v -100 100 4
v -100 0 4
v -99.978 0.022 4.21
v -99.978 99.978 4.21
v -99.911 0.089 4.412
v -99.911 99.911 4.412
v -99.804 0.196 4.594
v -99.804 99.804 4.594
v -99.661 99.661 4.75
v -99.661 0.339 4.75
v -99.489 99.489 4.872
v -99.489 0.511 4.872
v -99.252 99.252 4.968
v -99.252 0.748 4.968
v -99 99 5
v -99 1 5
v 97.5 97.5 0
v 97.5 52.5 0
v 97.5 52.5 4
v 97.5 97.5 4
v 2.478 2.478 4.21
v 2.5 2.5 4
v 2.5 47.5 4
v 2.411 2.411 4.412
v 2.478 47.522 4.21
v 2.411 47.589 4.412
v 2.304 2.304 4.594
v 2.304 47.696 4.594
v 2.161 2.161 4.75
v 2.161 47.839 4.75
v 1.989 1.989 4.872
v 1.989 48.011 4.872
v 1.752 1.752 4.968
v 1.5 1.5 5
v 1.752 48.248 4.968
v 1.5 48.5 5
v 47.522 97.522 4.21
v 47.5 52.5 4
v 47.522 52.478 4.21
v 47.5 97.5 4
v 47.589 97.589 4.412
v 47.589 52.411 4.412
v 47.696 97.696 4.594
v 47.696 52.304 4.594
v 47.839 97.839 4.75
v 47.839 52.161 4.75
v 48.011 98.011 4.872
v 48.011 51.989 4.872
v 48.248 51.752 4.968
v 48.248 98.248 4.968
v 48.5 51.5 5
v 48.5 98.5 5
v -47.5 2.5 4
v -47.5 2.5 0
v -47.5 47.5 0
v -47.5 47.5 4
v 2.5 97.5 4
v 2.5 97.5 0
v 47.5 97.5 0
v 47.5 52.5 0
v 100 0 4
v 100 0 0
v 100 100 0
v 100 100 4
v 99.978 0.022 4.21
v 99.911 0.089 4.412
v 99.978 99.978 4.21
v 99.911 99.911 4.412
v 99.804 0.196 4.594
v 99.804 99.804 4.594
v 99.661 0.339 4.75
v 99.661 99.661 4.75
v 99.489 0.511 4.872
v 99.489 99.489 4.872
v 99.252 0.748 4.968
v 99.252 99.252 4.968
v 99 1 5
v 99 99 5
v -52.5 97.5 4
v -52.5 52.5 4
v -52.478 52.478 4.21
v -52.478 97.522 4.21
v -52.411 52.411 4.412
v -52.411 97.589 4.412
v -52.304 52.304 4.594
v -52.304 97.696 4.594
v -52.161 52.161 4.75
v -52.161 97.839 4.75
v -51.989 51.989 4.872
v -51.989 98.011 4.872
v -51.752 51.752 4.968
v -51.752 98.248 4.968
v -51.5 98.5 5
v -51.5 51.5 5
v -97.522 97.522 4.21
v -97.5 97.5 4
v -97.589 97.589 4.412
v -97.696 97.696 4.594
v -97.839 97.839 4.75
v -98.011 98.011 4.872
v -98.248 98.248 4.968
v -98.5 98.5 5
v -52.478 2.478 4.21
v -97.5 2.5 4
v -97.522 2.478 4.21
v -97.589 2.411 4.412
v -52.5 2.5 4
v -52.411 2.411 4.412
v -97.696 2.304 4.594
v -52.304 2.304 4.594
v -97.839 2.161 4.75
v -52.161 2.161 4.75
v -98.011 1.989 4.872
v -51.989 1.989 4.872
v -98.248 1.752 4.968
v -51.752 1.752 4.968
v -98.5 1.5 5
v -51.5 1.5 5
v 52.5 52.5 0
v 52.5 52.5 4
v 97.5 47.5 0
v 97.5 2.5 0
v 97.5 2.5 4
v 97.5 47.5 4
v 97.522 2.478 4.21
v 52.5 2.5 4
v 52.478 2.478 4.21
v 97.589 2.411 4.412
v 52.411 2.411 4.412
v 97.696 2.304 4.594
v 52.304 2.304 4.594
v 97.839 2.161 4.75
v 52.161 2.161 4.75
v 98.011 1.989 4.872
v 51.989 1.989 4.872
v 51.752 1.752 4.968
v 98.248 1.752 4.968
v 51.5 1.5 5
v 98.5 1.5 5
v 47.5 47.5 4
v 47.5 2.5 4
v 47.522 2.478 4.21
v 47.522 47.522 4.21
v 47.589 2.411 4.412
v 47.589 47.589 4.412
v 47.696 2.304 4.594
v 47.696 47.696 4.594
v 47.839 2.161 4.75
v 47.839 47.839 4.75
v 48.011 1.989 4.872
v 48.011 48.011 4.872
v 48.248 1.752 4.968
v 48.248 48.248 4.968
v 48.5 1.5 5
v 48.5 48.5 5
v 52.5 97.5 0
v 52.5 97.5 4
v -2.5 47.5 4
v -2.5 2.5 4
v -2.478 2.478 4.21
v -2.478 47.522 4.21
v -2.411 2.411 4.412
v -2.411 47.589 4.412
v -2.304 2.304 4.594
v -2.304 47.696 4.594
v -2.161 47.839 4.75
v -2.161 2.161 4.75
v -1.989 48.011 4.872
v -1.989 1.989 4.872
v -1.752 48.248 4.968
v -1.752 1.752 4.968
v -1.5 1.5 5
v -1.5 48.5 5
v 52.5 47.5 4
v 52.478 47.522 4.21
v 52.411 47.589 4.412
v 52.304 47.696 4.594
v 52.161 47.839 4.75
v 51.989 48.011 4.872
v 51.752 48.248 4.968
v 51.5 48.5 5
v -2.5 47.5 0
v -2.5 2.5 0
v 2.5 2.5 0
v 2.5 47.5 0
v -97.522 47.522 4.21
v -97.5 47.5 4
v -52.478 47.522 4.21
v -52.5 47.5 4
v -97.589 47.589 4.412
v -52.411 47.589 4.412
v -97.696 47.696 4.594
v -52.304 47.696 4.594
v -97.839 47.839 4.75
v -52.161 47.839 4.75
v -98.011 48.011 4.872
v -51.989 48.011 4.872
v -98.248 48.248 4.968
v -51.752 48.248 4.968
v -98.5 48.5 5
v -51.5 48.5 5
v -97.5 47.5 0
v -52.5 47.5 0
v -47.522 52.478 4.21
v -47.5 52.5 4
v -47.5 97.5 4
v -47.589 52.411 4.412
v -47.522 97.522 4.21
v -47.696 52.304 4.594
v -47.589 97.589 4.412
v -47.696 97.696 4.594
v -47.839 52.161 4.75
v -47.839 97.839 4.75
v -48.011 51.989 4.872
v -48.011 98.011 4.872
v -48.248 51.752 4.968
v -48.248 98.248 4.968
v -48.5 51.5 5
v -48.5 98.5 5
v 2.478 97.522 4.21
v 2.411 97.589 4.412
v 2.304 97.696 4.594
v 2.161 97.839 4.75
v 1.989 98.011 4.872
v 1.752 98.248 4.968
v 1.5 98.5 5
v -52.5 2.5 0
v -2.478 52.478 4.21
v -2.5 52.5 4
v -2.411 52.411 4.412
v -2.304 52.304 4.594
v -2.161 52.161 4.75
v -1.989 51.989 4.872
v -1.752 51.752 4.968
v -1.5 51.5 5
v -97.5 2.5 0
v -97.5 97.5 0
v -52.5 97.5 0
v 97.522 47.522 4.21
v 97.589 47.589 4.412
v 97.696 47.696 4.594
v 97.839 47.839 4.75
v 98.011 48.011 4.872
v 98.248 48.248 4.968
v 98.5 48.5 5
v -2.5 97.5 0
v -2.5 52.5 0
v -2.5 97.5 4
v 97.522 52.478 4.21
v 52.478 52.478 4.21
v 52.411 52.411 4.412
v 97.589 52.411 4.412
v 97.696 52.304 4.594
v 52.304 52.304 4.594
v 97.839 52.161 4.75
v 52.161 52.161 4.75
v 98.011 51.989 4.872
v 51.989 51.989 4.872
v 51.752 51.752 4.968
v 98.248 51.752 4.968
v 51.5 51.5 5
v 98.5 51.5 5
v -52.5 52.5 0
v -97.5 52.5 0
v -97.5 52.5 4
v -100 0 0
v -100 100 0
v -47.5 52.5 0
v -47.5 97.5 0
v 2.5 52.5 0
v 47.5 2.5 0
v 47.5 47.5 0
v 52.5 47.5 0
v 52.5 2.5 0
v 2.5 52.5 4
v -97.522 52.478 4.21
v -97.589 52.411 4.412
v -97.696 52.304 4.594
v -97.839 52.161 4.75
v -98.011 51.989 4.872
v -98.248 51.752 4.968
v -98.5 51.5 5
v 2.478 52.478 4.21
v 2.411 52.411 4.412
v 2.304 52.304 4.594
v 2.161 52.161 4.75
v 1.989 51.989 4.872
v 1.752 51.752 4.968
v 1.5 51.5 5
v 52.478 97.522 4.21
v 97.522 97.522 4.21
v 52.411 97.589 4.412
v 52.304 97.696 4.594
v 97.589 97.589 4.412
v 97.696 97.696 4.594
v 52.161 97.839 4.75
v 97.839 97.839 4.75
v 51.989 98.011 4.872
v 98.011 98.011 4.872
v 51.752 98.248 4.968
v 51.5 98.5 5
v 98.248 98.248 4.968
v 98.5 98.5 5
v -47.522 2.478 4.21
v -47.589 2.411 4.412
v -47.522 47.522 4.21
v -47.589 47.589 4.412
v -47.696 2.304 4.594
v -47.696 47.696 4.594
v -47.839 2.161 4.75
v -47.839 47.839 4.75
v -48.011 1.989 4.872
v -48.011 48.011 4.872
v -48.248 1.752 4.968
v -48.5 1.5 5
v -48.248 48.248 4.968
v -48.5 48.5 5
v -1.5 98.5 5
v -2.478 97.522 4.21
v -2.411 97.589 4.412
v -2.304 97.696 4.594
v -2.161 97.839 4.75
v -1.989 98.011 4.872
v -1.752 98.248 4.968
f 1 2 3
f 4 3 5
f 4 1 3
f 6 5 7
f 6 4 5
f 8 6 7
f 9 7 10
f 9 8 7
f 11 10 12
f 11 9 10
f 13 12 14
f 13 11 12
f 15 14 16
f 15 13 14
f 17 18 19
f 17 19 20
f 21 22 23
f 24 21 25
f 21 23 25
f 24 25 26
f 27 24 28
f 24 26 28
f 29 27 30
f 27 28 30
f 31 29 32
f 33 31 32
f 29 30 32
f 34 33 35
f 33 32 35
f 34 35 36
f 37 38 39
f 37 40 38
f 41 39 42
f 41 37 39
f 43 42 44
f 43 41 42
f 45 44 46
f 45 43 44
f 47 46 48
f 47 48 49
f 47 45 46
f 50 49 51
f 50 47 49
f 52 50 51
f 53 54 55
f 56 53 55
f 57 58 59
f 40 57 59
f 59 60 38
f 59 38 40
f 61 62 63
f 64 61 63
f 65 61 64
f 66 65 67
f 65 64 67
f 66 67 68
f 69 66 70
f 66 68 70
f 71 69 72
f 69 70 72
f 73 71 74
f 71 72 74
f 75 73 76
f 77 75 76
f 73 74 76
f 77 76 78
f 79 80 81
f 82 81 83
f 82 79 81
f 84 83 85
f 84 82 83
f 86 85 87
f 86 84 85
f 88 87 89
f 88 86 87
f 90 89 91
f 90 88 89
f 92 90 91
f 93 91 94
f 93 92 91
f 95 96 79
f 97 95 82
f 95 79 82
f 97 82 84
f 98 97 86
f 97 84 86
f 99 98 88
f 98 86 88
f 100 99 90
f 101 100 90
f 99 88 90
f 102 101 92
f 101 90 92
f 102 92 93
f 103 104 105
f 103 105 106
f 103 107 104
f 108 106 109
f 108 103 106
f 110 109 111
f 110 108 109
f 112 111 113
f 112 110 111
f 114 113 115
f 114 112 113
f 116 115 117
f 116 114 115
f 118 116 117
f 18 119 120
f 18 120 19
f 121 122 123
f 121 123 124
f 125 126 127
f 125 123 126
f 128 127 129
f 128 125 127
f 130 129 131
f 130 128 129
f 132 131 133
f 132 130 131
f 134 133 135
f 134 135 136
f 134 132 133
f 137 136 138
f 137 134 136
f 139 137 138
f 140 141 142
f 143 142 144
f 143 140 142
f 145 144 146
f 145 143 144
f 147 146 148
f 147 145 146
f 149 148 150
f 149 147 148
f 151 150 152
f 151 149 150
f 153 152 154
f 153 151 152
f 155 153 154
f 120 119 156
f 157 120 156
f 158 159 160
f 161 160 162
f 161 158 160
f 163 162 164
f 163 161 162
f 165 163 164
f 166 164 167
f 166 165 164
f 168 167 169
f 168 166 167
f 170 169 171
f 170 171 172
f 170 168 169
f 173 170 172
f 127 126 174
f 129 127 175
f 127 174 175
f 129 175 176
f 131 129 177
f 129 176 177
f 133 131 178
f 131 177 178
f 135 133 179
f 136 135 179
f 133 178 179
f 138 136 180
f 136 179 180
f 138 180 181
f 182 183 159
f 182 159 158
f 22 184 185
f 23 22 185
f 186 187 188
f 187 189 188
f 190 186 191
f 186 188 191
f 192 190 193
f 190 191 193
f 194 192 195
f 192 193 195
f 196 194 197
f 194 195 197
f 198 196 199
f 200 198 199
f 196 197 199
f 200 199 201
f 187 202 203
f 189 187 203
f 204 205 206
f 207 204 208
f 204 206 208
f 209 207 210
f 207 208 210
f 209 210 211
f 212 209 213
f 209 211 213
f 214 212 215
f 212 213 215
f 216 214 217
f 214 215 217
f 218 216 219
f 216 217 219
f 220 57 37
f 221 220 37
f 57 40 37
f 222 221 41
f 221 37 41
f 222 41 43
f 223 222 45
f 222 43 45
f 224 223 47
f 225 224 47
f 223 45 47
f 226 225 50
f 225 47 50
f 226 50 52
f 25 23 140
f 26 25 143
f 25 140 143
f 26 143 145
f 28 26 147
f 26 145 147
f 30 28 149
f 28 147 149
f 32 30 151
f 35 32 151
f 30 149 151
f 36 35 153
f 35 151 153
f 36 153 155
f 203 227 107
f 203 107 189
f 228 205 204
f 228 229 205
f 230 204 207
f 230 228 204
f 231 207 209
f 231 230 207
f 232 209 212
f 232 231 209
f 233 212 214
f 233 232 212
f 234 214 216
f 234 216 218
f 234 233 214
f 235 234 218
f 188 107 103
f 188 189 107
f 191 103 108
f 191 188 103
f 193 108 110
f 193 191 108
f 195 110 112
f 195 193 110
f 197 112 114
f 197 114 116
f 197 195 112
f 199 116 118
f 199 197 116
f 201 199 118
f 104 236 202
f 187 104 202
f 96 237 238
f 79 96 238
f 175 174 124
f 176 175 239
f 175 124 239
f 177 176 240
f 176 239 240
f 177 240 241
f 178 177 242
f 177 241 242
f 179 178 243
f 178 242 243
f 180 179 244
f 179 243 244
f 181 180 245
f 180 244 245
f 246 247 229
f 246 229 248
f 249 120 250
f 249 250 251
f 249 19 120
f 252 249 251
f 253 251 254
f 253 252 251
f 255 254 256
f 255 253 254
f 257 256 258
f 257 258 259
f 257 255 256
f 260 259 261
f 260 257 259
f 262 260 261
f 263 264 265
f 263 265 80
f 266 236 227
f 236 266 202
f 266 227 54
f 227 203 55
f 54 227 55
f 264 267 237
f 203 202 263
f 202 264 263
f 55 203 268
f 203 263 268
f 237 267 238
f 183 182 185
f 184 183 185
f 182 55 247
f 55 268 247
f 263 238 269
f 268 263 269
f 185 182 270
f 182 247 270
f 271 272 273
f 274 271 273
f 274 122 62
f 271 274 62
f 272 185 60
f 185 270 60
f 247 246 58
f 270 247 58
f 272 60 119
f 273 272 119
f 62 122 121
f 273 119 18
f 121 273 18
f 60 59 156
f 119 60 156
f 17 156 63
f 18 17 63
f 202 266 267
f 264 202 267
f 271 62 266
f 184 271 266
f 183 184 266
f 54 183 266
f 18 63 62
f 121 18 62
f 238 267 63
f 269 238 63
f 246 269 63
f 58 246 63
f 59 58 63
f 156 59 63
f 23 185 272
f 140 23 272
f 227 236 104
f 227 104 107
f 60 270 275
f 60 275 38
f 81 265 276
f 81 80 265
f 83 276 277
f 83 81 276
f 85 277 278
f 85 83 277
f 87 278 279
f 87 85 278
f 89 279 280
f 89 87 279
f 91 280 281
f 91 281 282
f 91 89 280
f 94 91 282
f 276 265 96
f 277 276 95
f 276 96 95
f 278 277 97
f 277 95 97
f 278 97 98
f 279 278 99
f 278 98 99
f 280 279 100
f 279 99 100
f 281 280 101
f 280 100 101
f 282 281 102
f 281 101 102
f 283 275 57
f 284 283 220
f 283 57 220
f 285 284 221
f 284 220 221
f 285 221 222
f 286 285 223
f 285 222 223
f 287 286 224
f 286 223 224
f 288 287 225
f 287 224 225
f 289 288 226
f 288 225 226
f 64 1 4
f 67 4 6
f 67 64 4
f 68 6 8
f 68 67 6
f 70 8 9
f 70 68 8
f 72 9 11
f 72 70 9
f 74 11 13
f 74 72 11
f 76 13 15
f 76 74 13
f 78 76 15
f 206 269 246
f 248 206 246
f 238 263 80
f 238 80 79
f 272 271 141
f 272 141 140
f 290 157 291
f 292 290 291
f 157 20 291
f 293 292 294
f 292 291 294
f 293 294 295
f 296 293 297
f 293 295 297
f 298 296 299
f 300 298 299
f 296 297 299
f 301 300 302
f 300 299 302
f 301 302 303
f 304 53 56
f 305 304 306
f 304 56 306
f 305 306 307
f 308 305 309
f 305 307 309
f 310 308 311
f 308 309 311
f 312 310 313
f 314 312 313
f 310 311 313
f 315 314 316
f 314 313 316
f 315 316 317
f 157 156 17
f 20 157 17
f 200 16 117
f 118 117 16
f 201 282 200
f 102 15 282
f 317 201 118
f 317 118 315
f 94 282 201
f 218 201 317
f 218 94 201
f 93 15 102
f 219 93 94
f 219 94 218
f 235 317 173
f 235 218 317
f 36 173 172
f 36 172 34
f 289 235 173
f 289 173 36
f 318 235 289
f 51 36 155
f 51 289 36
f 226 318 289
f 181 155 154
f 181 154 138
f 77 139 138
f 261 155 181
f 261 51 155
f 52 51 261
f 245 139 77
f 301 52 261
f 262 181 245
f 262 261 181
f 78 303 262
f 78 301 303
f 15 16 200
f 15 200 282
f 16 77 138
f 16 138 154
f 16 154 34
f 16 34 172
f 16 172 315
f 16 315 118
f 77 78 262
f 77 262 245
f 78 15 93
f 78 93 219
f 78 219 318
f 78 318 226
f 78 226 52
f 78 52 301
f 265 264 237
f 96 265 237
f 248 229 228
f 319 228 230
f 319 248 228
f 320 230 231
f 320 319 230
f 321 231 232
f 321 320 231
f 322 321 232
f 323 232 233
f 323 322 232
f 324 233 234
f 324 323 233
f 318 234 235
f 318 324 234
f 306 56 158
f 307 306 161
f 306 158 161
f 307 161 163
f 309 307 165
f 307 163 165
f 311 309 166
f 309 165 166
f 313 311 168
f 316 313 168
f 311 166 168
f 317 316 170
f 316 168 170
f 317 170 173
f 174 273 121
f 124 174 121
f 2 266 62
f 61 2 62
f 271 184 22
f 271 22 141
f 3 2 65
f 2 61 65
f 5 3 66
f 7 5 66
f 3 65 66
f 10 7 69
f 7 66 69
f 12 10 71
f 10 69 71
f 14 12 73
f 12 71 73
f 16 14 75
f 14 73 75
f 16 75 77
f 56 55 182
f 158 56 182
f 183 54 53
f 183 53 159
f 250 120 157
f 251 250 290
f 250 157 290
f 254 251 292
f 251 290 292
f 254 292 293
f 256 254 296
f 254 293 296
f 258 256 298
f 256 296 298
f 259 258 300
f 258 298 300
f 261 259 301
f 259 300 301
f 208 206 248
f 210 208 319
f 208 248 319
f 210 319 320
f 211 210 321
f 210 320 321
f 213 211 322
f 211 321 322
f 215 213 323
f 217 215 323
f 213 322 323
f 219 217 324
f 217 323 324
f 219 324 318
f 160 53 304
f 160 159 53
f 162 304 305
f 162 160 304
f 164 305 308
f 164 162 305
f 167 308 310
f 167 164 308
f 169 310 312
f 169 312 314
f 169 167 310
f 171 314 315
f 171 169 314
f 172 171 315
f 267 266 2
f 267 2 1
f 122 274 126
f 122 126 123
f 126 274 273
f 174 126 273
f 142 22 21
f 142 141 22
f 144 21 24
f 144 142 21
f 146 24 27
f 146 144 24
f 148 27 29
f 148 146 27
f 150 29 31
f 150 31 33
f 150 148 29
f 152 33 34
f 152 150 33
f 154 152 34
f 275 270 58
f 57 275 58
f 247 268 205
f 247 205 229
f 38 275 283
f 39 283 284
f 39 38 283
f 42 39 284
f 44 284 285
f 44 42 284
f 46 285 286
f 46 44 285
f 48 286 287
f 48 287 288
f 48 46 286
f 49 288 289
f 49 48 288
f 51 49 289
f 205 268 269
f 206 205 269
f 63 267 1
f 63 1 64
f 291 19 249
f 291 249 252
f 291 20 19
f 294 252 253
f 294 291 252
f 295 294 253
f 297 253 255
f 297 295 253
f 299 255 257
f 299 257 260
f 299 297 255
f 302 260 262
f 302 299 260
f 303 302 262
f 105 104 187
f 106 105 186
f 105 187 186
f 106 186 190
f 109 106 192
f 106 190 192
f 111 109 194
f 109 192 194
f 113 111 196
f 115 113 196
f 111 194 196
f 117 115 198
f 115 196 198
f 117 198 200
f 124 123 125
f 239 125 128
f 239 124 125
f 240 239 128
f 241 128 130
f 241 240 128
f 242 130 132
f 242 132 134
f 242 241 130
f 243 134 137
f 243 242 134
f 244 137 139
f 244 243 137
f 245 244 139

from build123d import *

# Parameters (mm, degrees)
SKETCH2_W           = 200
SKETCH2_H           = 100
SKETCH2_W_2         = 45
SKETCH2_H_2         = 45
BOSS_EXTRUDE1_DEPTH = 5
FILLET2_R           = 1


with BuildPart() as part:
    # Sketch2 → Boss-Extrude1 (new body)
    with BuildSketch(Plane.XY):
        with Locations((0, 50)):
            Rectangle(SKETCH2_W, SKETCH2_H)
        with Locations((-75, 75)):
            Rectangle(SKETCH2_W_2, SKETCH2_H_2, mode=Mode.SUBTRACT)
        with Locations((-25, 75)):
            Rectangle(SKETCH2_W_2, SKETCH2_H_2, mode=Mode.SUBTRACT)
        with Locations((75, 25)):
            Rectangle(SKETCH2_W_2, SKETCH2_H_2, mode=Mode.SUBTRACT)
        with Locations((25, 75)):
            Rectangle(SKETCH2_W_2, SKETCH2_H_2, mode=Mode.SUBTRACT)
        with Locations((75, 75)):
            Rectangle(SKETCH2_W_2, SKETCH2_H_2, mode=Mode.SUBTRACT)
        with Locations((-75, 25)):
            Rectangle(SKETCH2_W_2, SKETCH2_H_2, mode=Mode.SUBTRACT)
        with Locations((-25, 25)):
            Rectangle(SKETCH2_W_2, SKETCH2_H_2, mode=Mode.SUBTRACT)
        with Locations((25, 25)):
            Rectangle(SKETCH2_W_2, SKETCH2_H_2, mode=Mode.SUBTRACT)
    extrude(amount=BOSS_EXTRUDE1_DEPTH)

    # Fillet2
    fillet2_edges = [part.edges().sort_by_distance(p)[0] for p in [
        (-75, 97.5, 5),
        (-97.5, 75, 5),
        (-75, 52.5, 5),
        (-52.5, 75, 5),
        (-100, 50, 5),
        (-25, 47.5, 5),
        (0, 0, 5),
        (-47.5, 25, 5),
        (-25, 2.5, 5),
        (-2.5, 25, 5),
        (25, 47.5, 5),
        (2.5, 25, 5),
        (25, 2.5, 5),
        (47.5, 25, 5),
        (75, 47.5, 5),
        (52.5, 25, 5),
        (75, 2.5, 5),
        (97.5, 25, 5),
        (100, 50, 5),
        (-25, 97.5, 5),
        (-47.5, 75, 5),
        (-25, 52.5, 5),
        (-2.5, 75, 5),
        (47.5, 75, 5),
        (25, 97.5, 5),
        (2.5, 75, 5),
        (25, 52.5, 5),
        (97.5, 75, 5),
        (75, 97.5, 5),
        (52.5, 75, 5),
        (75, 52.5, 5),
        (0, 100, 5),
        (-52.5, 25, 5),
        (-75, 47.5, 5),
        (-97.5, 25, 5),
        (-75, 2.5, 5),
    ]]
    fillet(fillet2_edges, radius=FILLET2_R)


solid = part.part
